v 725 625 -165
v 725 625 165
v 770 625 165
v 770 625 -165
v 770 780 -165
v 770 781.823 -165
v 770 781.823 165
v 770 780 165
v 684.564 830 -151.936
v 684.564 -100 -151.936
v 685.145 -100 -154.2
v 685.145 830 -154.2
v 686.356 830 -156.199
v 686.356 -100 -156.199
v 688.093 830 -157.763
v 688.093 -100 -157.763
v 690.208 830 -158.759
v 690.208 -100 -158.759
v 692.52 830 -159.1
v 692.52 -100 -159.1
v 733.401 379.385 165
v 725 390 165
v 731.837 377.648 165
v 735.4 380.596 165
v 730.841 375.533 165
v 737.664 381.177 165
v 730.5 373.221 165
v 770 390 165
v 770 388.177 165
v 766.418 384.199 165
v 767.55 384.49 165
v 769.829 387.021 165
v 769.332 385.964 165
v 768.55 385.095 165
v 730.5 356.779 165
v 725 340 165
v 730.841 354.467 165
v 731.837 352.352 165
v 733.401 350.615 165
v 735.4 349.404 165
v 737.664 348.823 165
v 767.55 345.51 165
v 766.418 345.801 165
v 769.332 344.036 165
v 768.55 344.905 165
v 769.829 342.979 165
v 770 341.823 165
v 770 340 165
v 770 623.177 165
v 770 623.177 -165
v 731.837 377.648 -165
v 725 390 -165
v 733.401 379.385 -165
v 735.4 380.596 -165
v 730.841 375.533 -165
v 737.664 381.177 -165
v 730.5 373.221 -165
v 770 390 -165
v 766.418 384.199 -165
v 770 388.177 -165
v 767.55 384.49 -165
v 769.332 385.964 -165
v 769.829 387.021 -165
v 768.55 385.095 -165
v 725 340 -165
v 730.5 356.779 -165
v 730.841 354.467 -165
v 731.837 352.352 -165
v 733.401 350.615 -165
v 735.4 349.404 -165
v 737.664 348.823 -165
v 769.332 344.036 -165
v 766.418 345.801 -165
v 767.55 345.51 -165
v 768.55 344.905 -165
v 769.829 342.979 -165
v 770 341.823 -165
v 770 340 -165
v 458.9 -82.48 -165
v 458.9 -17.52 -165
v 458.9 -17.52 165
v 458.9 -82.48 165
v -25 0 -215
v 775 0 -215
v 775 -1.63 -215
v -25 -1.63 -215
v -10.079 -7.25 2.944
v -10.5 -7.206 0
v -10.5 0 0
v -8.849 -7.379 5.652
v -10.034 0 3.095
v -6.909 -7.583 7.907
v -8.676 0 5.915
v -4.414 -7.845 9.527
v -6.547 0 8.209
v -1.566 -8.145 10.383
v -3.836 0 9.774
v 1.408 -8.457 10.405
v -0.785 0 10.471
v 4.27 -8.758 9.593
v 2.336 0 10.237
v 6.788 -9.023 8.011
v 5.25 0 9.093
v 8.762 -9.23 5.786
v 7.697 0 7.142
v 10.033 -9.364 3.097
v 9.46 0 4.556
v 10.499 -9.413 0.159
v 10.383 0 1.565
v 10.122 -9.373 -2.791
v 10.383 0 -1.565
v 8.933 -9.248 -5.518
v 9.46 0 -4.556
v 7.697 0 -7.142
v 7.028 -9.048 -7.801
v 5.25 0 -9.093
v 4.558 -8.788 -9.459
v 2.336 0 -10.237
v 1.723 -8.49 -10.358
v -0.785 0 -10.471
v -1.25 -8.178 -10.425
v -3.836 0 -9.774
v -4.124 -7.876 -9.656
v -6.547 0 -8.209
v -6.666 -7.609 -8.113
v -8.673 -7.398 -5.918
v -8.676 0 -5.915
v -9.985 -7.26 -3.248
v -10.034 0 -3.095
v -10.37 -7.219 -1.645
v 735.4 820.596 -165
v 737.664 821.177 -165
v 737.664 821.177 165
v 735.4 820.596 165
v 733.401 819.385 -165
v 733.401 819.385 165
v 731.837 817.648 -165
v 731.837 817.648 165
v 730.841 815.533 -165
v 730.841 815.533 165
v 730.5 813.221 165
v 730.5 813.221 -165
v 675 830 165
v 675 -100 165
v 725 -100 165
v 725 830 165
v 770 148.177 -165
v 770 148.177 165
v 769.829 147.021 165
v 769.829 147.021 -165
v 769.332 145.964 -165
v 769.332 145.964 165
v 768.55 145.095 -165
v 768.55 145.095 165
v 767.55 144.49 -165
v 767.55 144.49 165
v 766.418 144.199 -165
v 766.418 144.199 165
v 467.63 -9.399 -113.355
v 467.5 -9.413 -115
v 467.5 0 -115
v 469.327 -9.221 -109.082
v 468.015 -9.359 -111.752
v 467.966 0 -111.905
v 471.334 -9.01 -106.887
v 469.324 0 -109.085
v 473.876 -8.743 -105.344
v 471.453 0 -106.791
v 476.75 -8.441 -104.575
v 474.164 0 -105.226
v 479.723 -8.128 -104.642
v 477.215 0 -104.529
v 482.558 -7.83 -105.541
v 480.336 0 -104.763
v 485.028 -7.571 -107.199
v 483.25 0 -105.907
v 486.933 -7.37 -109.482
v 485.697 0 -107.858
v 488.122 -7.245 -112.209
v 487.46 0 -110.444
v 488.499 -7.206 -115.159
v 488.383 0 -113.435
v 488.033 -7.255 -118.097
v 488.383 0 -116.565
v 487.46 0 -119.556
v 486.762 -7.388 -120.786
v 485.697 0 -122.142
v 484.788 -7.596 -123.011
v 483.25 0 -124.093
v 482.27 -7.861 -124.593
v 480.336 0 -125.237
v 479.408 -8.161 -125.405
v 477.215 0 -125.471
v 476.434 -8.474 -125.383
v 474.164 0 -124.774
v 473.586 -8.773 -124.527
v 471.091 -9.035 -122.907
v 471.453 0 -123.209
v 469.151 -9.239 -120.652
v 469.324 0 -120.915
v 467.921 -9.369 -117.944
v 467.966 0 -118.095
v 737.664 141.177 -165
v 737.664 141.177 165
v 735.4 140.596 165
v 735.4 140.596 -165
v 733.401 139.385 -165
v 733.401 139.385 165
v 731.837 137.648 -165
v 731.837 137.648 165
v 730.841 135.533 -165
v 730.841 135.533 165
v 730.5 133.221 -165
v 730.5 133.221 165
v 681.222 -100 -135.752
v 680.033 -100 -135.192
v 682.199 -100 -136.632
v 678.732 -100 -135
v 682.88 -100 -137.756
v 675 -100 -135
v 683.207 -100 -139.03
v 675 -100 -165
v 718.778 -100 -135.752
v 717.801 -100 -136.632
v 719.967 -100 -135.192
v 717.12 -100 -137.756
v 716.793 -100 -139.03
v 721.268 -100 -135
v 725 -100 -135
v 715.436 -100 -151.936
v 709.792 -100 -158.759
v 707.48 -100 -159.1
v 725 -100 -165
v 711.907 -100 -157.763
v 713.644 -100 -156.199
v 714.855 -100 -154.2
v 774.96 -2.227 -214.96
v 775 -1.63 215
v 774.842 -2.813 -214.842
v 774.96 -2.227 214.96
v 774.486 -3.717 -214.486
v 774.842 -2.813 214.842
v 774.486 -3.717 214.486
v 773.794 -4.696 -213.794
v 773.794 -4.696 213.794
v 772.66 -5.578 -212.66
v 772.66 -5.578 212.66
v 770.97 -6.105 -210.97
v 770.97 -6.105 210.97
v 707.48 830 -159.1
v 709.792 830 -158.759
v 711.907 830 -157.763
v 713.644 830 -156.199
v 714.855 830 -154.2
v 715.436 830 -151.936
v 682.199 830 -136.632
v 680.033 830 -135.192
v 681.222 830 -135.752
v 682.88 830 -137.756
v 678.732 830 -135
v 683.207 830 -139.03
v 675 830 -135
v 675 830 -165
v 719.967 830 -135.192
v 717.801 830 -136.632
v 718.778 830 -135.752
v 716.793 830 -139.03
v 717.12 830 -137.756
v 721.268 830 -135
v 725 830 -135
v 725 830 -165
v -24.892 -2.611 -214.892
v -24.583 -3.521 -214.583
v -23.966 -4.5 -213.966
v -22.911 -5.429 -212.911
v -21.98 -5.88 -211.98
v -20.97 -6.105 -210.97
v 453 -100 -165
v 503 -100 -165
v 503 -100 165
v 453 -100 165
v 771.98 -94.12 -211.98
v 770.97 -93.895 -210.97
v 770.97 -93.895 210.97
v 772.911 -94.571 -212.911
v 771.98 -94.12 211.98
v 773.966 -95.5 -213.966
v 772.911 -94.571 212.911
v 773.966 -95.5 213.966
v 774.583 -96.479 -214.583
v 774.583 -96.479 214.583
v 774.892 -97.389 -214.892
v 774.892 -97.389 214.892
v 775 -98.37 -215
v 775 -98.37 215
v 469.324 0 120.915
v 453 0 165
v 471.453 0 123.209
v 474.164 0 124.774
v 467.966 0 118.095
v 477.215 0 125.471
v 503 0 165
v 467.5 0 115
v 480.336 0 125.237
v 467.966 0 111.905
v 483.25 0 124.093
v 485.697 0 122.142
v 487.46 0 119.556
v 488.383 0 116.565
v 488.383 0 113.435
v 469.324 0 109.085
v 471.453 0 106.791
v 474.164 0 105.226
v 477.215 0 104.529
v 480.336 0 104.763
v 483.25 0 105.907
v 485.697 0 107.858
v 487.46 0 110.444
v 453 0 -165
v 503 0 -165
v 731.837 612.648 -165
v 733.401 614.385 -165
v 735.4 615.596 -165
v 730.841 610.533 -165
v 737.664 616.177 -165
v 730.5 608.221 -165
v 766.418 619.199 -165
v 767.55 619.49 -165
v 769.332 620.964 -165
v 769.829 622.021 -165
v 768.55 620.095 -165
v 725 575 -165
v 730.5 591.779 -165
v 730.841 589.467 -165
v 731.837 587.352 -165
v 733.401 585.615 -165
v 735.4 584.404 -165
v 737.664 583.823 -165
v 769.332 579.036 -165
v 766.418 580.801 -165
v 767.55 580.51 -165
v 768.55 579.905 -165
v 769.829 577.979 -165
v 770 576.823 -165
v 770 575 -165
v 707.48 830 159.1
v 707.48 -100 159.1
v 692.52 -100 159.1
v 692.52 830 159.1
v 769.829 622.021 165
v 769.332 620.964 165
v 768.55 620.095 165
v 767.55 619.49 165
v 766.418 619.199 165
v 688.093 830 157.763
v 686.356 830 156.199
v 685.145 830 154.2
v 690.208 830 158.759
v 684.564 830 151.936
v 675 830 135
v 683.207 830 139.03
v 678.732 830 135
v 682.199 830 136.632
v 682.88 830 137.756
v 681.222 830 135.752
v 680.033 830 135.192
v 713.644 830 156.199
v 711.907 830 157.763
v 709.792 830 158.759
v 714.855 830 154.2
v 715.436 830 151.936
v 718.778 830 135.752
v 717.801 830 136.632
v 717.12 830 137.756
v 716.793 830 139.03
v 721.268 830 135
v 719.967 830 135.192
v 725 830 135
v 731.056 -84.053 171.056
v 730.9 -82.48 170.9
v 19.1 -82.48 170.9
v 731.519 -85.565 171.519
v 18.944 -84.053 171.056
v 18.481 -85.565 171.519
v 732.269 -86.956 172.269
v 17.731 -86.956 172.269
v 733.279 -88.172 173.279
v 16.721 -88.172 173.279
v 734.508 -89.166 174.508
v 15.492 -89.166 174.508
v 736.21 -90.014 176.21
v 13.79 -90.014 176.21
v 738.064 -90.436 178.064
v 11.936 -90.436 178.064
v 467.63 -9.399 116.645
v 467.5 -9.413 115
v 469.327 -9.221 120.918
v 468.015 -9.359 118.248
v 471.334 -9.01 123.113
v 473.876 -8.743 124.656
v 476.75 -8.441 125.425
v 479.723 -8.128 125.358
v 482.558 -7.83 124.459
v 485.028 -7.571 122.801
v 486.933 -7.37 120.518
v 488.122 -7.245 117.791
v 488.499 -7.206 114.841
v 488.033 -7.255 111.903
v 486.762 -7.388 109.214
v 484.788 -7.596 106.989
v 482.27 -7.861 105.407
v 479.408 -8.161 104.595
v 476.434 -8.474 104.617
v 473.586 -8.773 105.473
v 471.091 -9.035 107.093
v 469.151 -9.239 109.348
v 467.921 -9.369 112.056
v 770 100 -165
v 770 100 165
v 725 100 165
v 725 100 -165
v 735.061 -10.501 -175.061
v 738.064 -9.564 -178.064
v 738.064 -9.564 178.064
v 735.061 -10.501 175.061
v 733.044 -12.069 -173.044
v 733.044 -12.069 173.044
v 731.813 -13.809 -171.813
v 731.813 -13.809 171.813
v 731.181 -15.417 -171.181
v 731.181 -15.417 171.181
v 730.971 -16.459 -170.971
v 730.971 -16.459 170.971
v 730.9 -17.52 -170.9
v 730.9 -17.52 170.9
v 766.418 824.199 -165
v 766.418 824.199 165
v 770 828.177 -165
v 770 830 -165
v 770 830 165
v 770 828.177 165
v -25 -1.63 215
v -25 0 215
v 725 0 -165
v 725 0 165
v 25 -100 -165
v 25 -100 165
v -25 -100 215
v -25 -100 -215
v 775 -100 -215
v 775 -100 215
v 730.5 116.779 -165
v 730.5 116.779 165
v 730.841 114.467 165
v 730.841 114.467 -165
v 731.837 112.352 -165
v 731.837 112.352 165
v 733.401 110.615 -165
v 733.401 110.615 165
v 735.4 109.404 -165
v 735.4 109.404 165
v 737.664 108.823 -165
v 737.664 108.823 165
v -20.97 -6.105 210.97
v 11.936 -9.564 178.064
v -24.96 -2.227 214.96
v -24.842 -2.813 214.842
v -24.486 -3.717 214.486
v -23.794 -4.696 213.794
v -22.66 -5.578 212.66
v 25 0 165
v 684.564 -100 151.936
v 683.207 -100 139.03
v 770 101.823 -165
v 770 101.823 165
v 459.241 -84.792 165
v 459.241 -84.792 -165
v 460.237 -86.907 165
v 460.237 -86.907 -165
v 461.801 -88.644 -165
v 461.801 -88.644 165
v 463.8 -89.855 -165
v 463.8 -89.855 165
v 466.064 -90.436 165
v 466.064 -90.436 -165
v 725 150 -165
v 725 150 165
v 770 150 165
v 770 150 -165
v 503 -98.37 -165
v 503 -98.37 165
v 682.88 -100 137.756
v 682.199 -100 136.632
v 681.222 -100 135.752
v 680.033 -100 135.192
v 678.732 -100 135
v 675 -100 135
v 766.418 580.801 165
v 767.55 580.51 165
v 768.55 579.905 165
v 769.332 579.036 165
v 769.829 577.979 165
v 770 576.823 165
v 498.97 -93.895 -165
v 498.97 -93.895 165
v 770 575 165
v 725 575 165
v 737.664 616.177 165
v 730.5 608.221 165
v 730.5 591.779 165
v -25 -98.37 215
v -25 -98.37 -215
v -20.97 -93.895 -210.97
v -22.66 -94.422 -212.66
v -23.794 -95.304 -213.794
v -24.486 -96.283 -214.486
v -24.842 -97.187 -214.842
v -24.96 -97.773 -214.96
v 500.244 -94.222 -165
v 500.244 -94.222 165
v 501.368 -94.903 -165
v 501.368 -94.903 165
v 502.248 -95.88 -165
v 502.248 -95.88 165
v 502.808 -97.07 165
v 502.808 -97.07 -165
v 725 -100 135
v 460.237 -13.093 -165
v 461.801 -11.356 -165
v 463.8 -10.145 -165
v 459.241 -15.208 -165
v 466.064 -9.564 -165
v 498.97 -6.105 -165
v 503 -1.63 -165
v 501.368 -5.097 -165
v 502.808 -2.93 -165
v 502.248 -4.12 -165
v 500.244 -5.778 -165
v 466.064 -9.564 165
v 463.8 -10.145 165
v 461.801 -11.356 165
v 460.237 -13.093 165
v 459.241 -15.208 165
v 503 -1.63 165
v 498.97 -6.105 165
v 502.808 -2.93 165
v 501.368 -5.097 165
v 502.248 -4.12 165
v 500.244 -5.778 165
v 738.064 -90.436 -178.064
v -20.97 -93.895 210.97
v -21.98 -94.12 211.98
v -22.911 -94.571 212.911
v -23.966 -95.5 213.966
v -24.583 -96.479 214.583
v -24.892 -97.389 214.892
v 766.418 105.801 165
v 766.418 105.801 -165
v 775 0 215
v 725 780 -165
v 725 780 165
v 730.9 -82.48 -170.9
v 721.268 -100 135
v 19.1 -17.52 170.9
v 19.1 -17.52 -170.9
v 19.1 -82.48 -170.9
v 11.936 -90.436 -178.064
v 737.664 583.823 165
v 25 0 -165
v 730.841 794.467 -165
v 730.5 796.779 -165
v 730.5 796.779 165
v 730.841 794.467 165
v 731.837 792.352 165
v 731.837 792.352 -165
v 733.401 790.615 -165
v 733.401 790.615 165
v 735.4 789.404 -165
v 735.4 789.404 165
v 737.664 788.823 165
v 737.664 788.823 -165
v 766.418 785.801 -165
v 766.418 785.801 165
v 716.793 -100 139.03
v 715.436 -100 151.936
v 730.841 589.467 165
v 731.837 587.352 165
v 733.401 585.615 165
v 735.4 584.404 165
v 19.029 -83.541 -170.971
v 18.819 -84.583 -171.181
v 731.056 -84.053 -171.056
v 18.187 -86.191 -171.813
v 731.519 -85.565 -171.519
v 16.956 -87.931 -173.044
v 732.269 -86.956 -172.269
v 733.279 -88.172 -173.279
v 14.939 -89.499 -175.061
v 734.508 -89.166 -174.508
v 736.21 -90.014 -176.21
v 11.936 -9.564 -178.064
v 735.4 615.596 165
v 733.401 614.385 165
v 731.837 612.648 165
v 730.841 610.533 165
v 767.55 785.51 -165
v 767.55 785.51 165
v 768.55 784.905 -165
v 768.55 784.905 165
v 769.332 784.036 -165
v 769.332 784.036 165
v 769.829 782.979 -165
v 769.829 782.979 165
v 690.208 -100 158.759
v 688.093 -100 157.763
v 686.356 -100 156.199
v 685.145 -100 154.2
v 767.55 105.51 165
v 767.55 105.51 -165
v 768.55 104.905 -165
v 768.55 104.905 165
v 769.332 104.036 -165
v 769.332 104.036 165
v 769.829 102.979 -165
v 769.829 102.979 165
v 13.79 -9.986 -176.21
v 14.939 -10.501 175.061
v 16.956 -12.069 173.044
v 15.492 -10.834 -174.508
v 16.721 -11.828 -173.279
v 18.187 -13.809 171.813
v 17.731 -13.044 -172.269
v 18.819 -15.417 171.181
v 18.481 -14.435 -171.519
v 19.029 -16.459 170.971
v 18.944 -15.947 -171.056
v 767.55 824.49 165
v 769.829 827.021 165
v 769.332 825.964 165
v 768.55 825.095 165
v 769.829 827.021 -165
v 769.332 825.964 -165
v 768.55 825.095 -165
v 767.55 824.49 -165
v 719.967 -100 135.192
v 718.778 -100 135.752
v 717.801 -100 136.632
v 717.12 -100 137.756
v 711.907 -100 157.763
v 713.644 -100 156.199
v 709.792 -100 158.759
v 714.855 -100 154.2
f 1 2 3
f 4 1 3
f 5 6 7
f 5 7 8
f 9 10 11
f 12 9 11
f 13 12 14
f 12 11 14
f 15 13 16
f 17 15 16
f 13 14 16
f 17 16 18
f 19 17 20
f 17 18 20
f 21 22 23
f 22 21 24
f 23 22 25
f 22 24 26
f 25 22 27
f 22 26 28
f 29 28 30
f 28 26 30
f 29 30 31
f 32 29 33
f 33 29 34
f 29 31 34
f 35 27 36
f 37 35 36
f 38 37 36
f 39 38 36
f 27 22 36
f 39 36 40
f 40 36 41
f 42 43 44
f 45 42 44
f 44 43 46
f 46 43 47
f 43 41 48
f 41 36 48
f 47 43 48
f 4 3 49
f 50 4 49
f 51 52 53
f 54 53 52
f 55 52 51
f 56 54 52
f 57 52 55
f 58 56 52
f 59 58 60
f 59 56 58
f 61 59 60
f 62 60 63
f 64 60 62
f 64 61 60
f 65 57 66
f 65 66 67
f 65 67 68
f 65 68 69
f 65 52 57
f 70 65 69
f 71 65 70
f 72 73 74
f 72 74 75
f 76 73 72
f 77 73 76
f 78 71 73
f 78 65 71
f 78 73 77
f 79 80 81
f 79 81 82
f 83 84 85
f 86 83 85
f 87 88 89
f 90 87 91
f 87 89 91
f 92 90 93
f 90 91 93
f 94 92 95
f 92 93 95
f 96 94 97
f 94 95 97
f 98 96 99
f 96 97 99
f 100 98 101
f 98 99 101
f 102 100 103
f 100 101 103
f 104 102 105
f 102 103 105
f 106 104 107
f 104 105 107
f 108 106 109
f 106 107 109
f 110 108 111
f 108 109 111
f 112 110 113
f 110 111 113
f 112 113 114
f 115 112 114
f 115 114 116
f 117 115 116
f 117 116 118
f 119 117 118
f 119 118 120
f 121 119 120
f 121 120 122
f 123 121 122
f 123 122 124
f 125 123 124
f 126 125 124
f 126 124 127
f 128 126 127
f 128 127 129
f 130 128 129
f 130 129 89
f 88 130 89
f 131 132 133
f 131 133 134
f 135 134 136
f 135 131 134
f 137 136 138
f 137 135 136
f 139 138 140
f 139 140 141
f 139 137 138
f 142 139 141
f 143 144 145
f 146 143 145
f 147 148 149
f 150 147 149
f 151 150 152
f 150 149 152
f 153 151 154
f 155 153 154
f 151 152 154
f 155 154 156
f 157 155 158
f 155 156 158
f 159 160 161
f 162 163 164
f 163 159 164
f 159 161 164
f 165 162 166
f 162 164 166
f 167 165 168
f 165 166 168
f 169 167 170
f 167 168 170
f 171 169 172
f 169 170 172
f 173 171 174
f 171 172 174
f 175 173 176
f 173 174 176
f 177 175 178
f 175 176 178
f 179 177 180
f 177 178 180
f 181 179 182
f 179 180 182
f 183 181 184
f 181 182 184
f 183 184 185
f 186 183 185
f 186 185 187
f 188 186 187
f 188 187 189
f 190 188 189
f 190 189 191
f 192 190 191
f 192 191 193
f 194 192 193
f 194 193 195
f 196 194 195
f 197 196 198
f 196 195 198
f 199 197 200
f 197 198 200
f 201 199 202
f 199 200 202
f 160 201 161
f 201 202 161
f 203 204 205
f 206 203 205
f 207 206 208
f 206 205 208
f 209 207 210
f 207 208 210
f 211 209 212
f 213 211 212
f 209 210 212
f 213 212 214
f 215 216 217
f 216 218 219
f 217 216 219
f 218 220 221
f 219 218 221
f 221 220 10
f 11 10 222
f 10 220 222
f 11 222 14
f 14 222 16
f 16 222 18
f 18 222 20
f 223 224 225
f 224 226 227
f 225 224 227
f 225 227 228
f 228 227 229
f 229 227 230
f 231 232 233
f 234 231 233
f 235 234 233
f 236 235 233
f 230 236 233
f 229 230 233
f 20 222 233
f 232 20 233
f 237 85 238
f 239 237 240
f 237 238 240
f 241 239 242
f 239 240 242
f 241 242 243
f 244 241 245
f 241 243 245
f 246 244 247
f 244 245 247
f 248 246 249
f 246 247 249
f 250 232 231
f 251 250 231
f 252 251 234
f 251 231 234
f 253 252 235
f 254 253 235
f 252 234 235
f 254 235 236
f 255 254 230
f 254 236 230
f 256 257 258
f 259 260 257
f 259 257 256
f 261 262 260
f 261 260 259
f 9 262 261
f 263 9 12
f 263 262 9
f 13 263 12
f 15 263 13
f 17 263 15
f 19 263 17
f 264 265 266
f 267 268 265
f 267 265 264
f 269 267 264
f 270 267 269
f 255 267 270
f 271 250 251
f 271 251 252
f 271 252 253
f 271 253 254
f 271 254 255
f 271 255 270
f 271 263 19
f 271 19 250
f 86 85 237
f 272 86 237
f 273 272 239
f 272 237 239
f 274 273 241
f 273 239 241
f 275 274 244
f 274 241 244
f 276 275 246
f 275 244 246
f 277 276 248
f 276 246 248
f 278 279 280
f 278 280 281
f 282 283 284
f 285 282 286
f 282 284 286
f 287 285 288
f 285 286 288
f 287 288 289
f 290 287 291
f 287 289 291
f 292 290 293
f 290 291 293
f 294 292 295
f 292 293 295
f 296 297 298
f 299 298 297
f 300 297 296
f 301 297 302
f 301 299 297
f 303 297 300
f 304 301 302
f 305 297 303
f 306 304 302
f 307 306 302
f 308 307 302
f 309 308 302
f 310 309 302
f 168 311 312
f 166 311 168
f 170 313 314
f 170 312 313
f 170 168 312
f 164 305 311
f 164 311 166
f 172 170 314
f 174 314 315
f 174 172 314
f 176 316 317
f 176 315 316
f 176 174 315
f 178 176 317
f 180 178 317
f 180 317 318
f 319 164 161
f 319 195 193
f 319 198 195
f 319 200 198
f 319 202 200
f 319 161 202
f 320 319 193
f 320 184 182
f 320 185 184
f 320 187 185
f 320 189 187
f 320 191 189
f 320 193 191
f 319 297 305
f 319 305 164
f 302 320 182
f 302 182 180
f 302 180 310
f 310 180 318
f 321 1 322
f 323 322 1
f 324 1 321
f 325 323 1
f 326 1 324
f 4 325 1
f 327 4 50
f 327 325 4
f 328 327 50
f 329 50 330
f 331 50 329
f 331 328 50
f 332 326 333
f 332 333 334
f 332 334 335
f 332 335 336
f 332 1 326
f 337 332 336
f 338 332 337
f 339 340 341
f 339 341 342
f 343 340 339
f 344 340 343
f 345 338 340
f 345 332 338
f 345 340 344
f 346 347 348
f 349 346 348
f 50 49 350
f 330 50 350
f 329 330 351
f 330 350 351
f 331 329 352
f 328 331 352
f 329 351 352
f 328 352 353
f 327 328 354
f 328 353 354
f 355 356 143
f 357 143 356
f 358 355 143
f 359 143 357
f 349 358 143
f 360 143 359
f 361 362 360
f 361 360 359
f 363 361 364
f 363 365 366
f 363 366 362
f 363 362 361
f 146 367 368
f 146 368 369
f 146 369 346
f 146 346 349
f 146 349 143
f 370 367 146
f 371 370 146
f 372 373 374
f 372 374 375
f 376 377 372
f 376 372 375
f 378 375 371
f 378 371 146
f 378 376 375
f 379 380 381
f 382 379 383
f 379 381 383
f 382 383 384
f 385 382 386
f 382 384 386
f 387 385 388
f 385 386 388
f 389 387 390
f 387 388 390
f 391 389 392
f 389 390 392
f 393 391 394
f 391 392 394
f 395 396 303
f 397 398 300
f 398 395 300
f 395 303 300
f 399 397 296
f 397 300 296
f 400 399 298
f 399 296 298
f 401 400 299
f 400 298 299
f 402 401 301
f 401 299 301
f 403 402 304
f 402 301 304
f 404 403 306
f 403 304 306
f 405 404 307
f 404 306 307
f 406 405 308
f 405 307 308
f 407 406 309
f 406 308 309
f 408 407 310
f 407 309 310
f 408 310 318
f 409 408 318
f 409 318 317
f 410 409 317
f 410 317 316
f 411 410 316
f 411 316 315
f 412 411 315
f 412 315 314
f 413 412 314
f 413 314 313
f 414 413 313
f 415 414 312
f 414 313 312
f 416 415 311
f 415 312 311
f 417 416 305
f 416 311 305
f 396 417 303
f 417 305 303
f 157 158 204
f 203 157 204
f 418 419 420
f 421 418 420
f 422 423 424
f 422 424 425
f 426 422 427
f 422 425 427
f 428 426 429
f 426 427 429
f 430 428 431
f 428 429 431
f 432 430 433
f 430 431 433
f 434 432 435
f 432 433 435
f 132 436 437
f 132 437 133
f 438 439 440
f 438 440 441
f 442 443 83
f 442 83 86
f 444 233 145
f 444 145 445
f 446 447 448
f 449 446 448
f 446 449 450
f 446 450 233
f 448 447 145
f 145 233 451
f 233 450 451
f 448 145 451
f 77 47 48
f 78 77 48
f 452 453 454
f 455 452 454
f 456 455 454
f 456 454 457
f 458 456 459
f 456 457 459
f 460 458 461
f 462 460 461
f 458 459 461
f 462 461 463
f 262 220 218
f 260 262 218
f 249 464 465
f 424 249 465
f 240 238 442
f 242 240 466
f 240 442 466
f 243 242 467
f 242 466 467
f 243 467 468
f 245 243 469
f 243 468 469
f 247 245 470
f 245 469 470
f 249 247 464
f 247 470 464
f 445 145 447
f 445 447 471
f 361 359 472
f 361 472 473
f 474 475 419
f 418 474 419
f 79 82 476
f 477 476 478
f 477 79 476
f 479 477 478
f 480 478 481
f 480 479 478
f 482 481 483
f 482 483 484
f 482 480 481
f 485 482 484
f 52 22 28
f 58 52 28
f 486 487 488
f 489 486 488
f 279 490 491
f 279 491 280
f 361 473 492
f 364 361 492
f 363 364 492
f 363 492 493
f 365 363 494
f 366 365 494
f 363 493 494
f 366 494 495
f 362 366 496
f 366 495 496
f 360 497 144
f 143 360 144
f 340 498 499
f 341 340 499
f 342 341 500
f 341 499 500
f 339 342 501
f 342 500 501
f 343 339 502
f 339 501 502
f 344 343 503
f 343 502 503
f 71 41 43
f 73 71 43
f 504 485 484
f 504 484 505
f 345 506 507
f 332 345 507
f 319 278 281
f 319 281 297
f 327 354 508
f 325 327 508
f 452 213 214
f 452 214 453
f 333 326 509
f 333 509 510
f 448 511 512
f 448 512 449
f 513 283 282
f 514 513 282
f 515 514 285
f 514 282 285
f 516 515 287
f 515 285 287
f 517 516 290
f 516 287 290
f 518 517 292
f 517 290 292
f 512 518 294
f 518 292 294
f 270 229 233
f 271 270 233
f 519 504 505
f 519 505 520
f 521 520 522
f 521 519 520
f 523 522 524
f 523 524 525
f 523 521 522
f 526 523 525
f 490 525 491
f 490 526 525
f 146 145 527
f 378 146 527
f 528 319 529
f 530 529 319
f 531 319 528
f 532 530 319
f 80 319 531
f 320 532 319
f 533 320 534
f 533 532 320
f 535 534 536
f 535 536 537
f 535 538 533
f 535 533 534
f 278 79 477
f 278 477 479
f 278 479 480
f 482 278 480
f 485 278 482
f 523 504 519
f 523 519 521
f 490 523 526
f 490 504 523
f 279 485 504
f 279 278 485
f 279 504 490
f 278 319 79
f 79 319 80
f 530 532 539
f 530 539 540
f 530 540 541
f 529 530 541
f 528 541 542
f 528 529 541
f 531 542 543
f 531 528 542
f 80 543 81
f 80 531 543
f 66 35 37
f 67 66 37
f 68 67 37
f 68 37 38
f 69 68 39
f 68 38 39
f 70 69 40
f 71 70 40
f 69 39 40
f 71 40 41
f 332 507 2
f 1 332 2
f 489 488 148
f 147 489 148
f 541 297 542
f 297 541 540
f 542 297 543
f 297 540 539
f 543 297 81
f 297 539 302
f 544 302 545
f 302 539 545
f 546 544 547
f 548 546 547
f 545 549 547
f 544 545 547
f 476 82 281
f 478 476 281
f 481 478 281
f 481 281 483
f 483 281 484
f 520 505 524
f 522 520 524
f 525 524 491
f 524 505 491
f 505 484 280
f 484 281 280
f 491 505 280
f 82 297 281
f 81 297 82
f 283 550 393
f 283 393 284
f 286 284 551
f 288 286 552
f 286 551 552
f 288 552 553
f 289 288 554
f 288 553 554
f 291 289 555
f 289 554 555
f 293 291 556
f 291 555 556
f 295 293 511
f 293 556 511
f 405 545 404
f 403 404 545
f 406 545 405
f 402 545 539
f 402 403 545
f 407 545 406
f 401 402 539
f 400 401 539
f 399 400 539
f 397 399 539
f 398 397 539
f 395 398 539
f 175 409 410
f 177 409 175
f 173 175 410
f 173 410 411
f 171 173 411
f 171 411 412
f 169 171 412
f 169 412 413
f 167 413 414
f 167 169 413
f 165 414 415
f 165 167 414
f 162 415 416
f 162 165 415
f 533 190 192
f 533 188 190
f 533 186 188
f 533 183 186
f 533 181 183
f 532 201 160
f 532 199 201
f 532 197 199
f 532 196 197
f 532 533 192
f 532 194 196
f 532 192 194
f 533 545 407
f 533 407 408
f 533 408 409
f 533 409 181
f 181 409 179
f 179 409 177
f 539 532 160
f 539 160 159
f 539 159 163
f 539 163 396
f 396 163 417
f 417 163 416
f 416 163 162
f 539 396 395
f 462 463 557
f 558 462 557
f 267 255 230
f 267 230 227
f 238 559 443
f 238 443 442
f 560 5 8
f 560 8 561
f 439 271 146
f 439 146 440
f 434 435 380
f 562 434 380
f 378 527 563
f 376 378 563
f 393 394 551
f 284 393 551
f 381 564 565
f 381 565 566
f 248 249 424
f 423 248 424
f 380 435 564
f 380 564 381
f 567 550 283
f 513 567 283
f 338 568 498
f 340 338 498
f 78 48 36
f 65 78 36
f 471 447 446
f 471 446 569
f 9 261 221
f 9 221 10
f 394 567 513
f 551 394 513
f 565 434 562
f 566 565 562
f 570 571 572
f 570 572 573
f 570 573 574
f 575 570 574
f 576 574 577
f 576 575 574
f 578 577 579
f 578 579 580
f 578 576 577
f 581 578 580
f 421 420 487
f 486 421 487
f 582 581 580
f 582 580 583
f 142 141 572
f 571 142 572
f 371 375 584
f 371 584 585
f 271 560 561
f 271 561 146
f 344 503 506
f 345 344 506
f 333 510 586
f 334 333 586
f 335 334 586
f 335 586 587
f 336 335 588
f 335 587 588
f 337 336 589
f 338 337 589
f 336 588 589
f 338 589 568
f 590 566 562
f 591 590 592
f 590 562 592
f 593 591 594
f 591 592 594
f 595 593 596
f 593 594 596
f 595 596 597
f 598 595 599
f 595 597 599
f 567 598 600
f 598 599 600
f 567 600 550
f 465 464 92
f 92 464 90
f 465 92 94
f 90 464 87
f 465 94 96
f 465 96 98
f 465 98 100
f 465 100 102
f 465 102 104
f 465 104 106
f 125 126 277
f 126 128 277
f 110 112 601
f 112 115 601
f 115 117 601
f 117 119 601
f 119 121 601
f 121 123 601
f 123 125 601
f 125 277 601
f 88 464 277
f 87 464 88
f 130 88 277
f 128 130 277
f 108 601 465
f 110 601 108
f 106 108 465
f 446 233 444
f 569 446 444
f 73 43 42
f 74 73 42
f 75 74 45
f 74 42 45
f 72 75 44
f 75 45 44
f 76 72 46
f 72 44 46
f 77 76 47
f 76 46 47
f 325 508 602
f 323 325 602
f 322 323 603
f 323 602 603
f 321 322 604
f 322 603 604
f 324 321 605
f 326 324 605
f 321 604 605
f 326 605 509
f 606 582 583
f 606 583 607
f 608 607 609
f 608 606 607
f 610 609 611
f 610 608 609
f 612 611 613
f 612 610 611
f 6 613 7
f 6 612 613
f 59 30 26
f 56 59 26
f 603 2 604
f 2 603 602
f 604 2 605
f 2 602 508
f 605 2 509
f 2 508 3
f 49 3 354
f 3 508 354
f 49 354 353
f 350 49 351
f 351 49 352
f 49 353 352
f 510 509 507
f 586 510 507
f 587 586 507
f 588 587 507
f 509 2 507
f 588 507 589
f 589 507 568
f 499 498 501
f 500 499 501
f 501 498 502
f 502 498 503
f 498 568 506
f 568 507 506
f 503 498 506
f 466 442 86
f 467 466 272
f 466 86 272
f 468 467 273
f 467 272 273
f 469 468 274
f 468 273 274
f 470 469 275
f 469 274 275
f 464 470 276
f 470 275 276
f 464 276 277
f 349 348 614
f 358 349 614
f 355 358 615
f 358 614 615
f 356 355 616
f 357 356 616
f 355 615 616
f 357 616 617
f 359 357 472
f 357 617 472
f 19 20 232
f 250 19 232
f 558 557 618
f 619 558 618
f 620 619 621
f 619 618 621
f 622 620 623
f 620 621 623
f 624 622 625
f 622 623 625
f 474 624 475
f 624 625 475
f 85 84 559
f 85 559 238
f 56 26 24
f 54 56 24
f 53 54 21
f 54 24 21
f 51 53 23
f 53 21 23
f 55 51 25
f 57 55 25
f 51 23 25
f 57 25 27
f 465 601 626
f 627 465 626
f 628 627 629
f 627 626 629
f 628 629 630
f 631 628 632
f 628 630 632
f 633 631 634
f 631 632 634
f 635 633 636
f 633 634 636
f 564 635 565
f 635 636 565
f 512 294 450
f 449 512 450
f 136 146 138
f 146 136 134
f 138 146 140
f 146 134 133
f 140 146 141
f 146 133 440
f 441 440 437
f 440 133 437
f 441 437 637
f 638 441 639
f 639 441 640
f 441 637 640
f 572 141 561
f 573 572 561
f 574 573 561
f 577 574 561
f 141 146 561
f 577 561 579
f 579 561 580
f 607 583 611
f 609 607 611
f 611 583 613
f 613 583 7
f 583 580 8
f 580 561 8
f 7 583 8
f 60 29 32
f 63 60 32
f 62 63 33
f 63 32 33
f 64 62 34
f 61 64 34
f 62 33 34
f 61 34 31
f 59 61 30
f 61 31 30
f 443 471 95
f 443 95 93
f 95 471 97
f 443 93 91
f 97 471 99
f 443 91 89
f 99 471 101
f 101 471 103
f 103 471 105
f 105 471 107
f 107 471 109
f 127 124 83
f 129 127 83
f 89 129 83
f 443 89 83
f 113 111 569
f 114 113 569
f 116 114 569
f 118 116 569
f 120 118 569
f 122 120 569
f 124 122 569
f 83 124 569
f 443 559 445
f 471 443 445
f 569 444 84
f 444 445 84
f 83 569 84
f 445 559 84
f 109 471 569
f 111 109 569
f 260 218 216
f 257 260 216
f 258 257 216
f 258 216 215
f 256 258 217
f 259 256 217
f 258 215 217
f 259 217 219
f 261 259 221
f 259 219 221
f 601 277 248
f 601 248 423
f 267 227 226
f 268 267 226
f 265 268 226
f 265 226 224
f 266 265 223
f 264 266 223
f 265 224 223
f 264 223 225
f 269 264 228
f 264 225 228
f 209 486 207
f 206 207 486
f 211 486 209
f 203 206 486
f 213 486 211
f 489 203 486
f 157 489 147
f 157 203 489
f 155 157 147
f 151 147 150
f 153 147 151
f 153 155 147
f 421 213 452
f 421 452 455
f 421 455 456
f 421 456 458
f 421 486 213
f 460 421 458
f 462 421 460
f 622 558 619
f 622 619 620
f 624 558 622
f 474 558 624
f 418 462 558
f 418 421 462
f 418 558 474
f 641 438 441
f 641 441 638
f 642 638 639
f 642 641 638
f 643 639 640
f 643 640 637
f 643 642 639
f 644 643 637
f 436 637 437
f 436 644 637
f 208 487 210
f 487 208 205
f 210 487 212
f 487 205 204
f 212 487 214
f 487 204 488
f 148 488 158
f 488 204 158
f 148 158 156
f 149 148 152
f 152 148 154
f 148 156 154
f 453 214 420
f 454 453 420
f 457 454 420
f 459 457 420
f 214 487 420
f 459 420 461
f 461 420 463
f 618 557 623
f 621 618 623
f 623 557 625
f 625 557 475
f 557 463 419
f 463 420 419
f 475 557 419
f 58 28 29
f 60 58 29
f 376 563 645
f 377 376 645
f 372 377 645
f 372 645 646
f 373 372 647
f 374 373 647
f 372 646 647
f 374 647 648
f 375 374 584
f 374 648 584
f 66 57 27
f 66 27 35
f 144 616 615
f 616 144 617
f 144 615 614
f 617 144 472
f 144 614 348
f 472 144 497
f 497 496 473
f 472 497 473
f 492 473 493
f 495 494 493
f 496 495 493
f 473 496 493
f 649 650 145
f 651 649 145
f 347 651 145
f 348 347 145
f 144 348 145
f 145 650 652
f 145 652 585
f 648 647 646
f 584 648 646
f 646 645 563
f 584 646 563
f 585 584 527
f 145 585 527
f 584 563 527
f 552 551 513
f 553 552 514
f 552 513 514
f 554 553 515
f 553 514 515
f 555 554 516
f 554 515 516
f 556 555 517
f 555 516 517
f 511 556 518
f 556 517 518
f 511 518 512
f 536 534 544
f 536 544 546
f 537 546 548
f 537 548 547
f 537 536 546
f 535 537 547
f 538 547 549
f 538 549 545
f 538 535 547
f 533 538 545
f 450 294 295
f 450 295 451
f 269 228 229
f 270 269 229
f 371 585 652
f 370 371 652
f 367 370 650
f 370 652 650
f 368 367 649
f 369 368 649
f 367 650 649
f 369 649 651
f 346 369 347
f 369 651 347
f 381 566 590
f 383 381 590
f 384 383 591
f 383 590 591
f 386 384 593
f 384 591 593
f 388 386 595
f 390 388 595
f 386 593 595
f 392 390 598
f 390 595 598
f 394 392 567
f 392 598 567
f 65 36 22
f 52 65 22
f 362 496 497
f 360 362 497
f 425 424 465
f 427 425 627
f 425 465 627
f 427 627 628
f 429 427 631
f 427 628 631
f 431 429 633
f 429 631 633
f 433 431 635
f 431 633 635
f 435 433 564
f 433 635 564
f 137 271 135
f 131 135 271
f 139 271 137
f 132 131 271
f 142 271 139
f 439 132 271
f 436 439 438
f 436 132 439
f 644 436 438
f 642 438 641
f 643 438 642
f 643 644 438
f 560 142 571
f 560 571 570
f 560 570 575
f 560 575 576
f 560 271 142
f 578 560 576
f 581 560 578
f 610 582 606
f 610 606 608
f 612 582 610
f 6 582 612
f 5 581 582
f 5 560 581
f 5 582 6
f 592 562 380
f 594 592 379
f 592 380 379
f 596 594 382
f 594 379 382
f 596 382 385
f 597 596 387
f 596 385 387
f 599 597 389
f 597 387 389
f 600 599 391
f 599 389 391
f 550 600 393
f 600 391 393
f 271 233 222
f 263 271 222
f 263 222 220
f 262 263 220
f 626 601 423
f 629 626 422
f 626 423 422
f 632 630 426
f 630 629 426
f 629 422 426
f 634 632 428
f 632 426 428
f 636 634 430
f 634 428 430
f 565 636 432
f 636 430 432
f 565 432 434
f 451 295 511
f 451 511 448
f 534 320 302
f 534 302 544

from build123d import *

# Parameters (mm, degrees)
MEMBER_1_DEPTH      = 442.803398875
MEMBER_1_DEPTH_BACK = 112.803398875
MEMBER_1_2_DEPTH    = 925.60679775
MEMBER_1_3_DEPTH    = 555.60679775
MEMBER_1_4_DEPTH    = 925.60679775
MEMBER_2_DEPTH      = 330
SKETCH_4_R          = 10.5
CUT_EXTRUDE_1_DEPTH = 10
MEMBER_START        = -100
MEMBER_3_DEPTH      = 930
MEMBER_5_DEPTH      = 330
MEMBER_5_2_DEPTH    = 330
MEMBER_5_3_DEPTH    = 330
MEMBER_5_4_DEPTH    = 330


# Read off the part's stored shape, not the designer's step: Конструкция3
with BuildPart() as part:
    # Sketch1 → Member 1 (new, two sides: drawn at the far end of the back side and taken through both)
    with BuildSketch(Plane(origin=(25, 0, -165), x_dir=(-1, 0, 0), z_dir=(0, 0, 1)).offset(-MEMBER_1_DEPTH_BACK)):
        with BuildLine():
            Line((50, 100), (0, 100))
            Line((0, 100), (0, 0))
            Line((0, 0), (50, 0))
            Line((50, 0), (50, 1.629852671))
            ThreePointArc((50, 1.629852671), (48.844151715, 4.6409404), (45.970378085, 6.1052012))
            Line((45.970378085, 6.1052012), (13.063772294, 9.563824837))
            ThreePointArc((13.063772294, 9.563824837), (7.954841396, 12.166955149), (5.9, 17.52))
            Line((5.9, 17.52), (5.9, 82.48))
            ThreePointArc((5.9, 82.48), (7.954841396, 87.833044851), (13.063772294, 90.436175163))
            Line((13.063772294, 90.436175163), (45.970378085, 93.8947988))
            ThreePointArc((45.970378085, 93.8947988), (48.844151715, 95.3590596), (50, 98.370147329))
            Line((50, 98.370147329), (50, 100))
        make_face()
    extrude(amount=MEMBER_1_DEPTH + MEMBER_1_DEPTH_BACK)

    # Member 1 mitre 1
    split(bisect_by=Plane(origin=(25, 0, -165), x_dir=(0, -1, 0), z_dir=(-0.707106781, 0, 0.707106781)), keep=Keep.TOP)

    # Member 1 mitre 2
    split(bisect_by=Plane(origin=(25, 0, 165), x_dir=(0, -1, 0), z_dir=(-0.707106781, 0, -0.707106781)), keep=Keep.TOP)


with BuildPart() as body_2:
    # Sketch1 on segment 2 (carried to segment 2) → Member 1 2 (new body)
    with BuildSketch(Plane(origin=(-87.803398875, 0, 165), x_dir=(0, 0, 1), z_dir=(1, 0, 0))):
        with BuildLine():
            Line((50, 100), (0, 100))
            Line((0, 100), (0, 0))
            Line((0, 0), (50, 0))
            Line((50, 0), (50, 1.629852671))
            ThreePointArc((50, 1.629852671), (48.844151715, 4.6409404), (45.970378085, 6.1052012))
            Line((45.970378085, 6.1052012), (13.063772294, 9.563824837))
            ThreePointArc((13.063772294, 9.563824837), (7.954841396, 12.166955149), (5.9, 17.52))
            Line((5.9, 17.52), (5.9, 82.48))
            ThreePointArc((5.9, 82.48), (7.954841396, 87.833044851), (13.063772294, 90.436175163))
            Line((13.063772294, 90.436175163), (45.970378085, 93.8947988))
            ThreePointArc((45.970378085, 93.8947988), (48.844151715, 95.3590596), (50, 98.370147329))
            Line((50, 98.370147329), (50, 100))
        make_face()
    extrude(amount=MEMBER_1_2_DEPTH)

    # Member 1 2 mitre 1
    split(bisect_by=Plane(origin=(25, 0, 165), x_dir=(0, 1, 0), z_dir=(0.707106781, 0, 0.707106781)), keep=Keep.TOP)

    # Member 1 2 mitre 2
    split(bisect_by=Plane(origin=(725, 0, 165), x_dir=(0, -1, 0), z_dir=(-0.707106781, 0, 0.707106781)), keep=Keep.TOP)


with BuildPart() as body_3:
    # Sketch1 on segment 3 (carried to segment 3) → Member 1 3 (new body)
    with BuildSketch(Plane(origin=(725, 0, 277.803398875), x_dir=(1, 0, 0), z_dir=(0, 0, -1))):
        with BuildLine():
            Line((50, 100), (0, 100))
            Line((0, 100), (0, 0))
            Line((0, 0), (50, 0))
            Line((50, 0), (50, 1.629852671))
            ThreePointArc((50, 1.629852671), (48.844151715, 4.6409404), (45.970378085, 6.1052012))
            Line((45.970378085, 6.1052012), (13.063772294, 9.563824837))
            ThreePointArc((13.063772294, 9.563824837), (7.954841396, 12.166955149), (5.9, 17.52))
            Line((5.9, 17.52), (5.9, 82.48))
            ThreePointArc((5.9, 82.48), (7.954841396, 87.833044851), (13.063772294, 90.436175163))
            Line((13.063772294, 90.436175163), (45.970378085, 93.8947988))
            ThreePointArc((45.970378085, 93.8947988), (48.844151715, 95.3590596), (50, 98.370147329))
            Line((50, 98.370147329), (50, 100))
        make_face()
    extrude(amount=MEMBER_1_3_DEPTH)

    # Member 1 3 mitre 1
    split(bisect_by=Plane(origin=(725, 0, 165), x_dir=(0, 1, 0), z_dir=(0.707106781, 0, -0.707106781)), keep=Keep.TOP)

    # Member 1 3 mitre 2
    split(bisect_by=Plane(origin=(725, 0, -165), x_dir=(0, 1, 0), z_dir=(0.707106781, 0, 0.707106781)), keep=Keep.TOP)


with BuildPart() as body_4:
    # Sketch1 on segment 4 (carried to segment 4) → Member 1 4 (new body)
    with BuildSketch(Plane(origin=(837.803398875, 0, -165), x_dir=(0, 0, -1), z_dir=(-1, 0, 0))):
        with BuildLine():
            Line((50, 100), (0, 100))
            Line((0, 100), (0, 0))
            Line((0, 0), (50, 0))
            Line((50, 0), (50, 1.629852671))
            ThreePointArc((50, 1.629852671), (48.844151715, 4.6409404), (45.970378085, 6.1052012))
            Line((45.970378085, 6.1052012), (13.063772294, 9.563824837))
            ThreePointArc((13.063772294, 9.563824837), (7.954841396, 12.166955149), (5.9, 17.52))
            Line((5.9, 17.52), (5.9, 82.48))
            ThreePointArc((5.9, 82.48), (7.954841396, 87.833044851), (13.063772294, 90.436175163))
            Line((13.063772294, 90.436175163), (45.970378085, 93.8947988))
            ThreePointArc((45.970378085, 93.8947988), (48.844151715, 95.3590596), (50, 98.370147329))
            Line((50, 98.370147329), (50, 100))
        make_face()
    extrude(amount=MEMBER_1_4_DEPTH)

    # Member 1 4 mitre 1
    split(bisect_by=Plane(origin=(25, 0, -165), x_dir=(0, 1, 0), z_dir=(0.707106781, 0, -0.707106781)), keep=Keep.TOP)

    # Member 1 4 mitre 2
    split(bisect_by=Plane(origin=(725, 0, -165), x_dir=(0, -1, 0), z_dir=(-0.707106781, 0, -0.707106781)), keep=Keep.TOP)


with BuildPart() as part_1:
    add(part.part)

    # Member 1 as one body: union body 2, body 3, body 4
    add(body_2.part)
    add(body_3.part)
    add(body_4.part)


with BuildPart() as body_2_2:
    # Sketch11 → Member 2 (new body)
    with BuildSketch(Plane(origin=(453, 0, -165), x_dir=(1, 0, 0), z_dir=(0, 0, -1))):
        with BuildLine():
            Line((50, 100), (0, 100))
            Line((0, 100), (0, 0))
            Line((0, 0), (50, 0))
            Line((50, 0), (50, 1.629852671))
            ThreePointArc((50, 1.629852671), (48.844151715, 4.6409404), (45.970378085, 6.1052012))
            Line((45.970378085, 6.1052012), (13.063772294, 9.563824837))
            ThreePointArc((13.063772294, 9.563824837), (7.954841396, 12.166955149), (5.9, 17.52))
            Line((5.9, 17.52), (5.9, 82.48))
            ThreePointArc((5.9, 82.48), (7.954841396, 87.833044851), (13.063772294, 90.436175163))
            Line((13.063772294, 90.436175163), (45.970378085, 93.8947988))
            ThreePointArc((45.970378085, 93.8947988), (48.844151715, 95.3590596), (50, 98.370147329))
            Line((50, 98.370147329), (50, 100))
        make_face()
    extrude(amount=-MEMBER_2_DEPTH)


with BuildPart() as cut_extrude_1_tool:
    # Эскиз4 → Вырез-Вытянуть1 (new body)
    with BuildSketch(Plane(origin=(0, 0, 0), x_dir=(1, 0, 0), z_dir=(0, 1, 0))):
        with Locations(Location((0, 0, 0), (0, 0, 180))):
            Circle(SKETCH_4_R)
        with Locations(Location((478, -115, 0), (0, 0, 180))):
            Circle(SKETCH_4_R)
        with Locations(Location((478, 115, 0), (0, 0, 180))):
            Circle(SKETCH_4_R)
    extrude(amount=-CUT_EXTRUDE_1_DEPTH)


with BuildPart() as part_2:
    add(part_1.part)

    # Вырез-Вытянуть1: cut by cut_extrude_1_tool
    add(cut_extrude_1_tool.part, mode=Mode.SUBTRACT)


with BuildPart() as body_2_2_1:
    add(body_2_2.part)

    # Вырез-Вытянуть1: cut by cut_extrude_1_tool
    add(cut_extrude_1_tool.part, mode=Mode.SUBTRACT)


with BuildPart() as body_3_2:
    # Member 3 outline → Member 3 (new body)
    with BuildSketch(Plane(origin=(0, 0, 0), x_dir=(1, 0, 0), z_dir=(0, 1, 0)).offset(MEMBER_START)):
        with BuildLine():
            Line((684.563824837, -151.936227706), (683.207285906, -139.029621915))
            ThreePointArc((683.207285906, -139.029621915), (681.743025105, -136.155848285), (678.731937376, -135))
            Line((678.731937376, -135), (675, -135))
            Line((675, -135), (675, -165))
            Line((675, -165), (725, -165))
            Line((725, -165), (725, -135))
            Line((725, -135), (721.268062624, -135))
            ThreePointArc((721.268062624, -135), (718.256974895, -136.155848285), (716.792714094, -139.029621915))
            Line((716.792714094, -139.029621915), (715.436175163, -151.936227706))
            ThreePointArc((715.436175163, -151.936227706), (712.833044851, -157.045158604), (707.48, -159.1))
            Line((707.48, -159.1), (692.52, -159.1))
            ThreePointArc((692.52, -159.1), (687.166955149, -157.045158604), (684.563824837, -151.936227706))
        make_face()
        with BuildLine():
            Line((721.268062624, 135), (725, 135))
            Line((725, 135), (725, 165))
            Line((725, 165), (675, 165))
            Line((675, 165), (675, 135))
            Line((675, 135), (678.731937376, 135))
            ThreePointArc((678.731937376, 135), (681.743025105, 136.155848285), (683.207285906, 139.029621915))
            Line((683.207285906, 139.029621915), (684.563824837, 151.936227706))
            ThreePointArc((684.563824837, 151.936227706), (687.166955149, 157.045158604), (692.52, 159.1))
            Line((692.52, 159.1), (707.48, 159.1))
            ThreePointArc((707.48, 159.1), (712.833044851, 157.045158604), (715.436175163, 151.936227706))
            Line((715.436175163, 151.936227706), (716.792714094, 139.029621915))
            ThreePointArc((716.792714094, 139.029621915), (718.256974895, 136.155848285), (721.268062624, 135))
        make_face()
    extrude(amount=MEMBER_3_DEPTH)


with BuildPart() as body_4_2:
    # Sketch16 → Member 5 (new body)
    with BuildSketch(Plane(origin=(725, 830, -165), x_dir=(1, 0, 0), z_dir=(0, 0, -1))):
        with BuildLine():
            Line((45, 50), (0, 50))
            Line((0, 50), (0, 0))
            Line((0, 0), (45, 0))
            Line((45, 0), (45, 1.822575176))
            ThreePointArc((45, 1.822575176), (43.972579302, 4.499097602), (41.418113853, 5.800662758))
            Line((41.418113853, 5.800662758), (12.663772294, 8.822865838))
            ThreePointArc((12.663772294, 8.822865838), (7.554841396, 11.42599615), (5.5, 16.779041001))
            Line((5.5, 16.779041001), (5.5, 33.220958999))
            ThreePointArc((5.5, 33.220958999), (7.554841396, 38.57400385), (12.663772294, 41.177134162))
            Line((12.663772294, 41.177134162), (41.418113853, 44.199337242))
            ThreePointArc((41.418113853, 44.199337242), (43.972579302, 45.500902398), (45, 48.177424824))
            Line((45, 48.177424824), (45, 50))
        make_face()
    extrude(amount=-MEMBER_5_DEPTH)


with BuildPart() as body_5:
    # Sketch16 on segment 2 (carried to segment 2) → Member 5 2 (new body)
    with BuildSketch(Plane(origin=(725, 150, 165), x_dir=(1, 0, 0), z_dir=(0, 0, -1))):
        with BuildLine():
            Line((45, 50), (0, 50))
            Line((0, 50), (0, 0))
            Line((0, 0), (45, 0))
            Line((45, 0), (45, 1.822575176))
            ThreePointArc((45, 1.822575176), (43.972579302, 4.499097602), (41.418113853, 5.800662758))
            Line((41.418113853, 5.800662758), (12.663772294, 8.822865838))
            ThreePointArc((12.663772294, 8.822865838), (7.554841396, 11.42599615), (5.5, 16.779041001))
            Line((5.5, 16.779041001), (5.5, 33.220958999))
            ThreePointArc((5.5, 33.220958999), (7.554841396, 38.57400385), (12.663772294, 41.177134162))
            Line((12.663772294, 41.177134162), (41.418113853, 44.199337242))
            ThreePointArc((41.418113853, 44.199337242), (43.972579302, 45.500902398), (45, 48.177424824))
            Line((45, 48.177424824), (45, 50))
        make_face()
    extrude(amount=MEMBER_5_2_DEPTH)


with BuildPart() as body_6:
    # Sketch16 on segment 3 (carried to segment 3) → Member 5 3 (new body)
    with BuildSketch(Plane(origin=(725, 625, 165), x_dir=(1, 0, 0), z_dir=(0, 0, -1))):
        with BuildLine():
            Line((45, 50), (0, 50))
            Line((0, 50), (0, 0))
            Line((0, 0), (45, 0))
            Line((45, 0), (45, 1.822575176))
            ThreePointArc((45, 1.822575176), (43.972579302, 4.499097602), (41.418113853, 5.800662758))
            Line((41.418113853, 5.800662758), (12.663772294, 8.822865838))
            ThreePointArc((12.663772294, 8.822865838), (7.554841396, 11.42599615), (5.5, 16.779041001))
            Line((5.5, 16.779041001), (5.5, 33.220958999))
            ThreePointArc((5.5, 33.220958999), (7.554841396, 38.57400385), (12.663772294, 41.177134162))
            Line((12.663772294, 41.177134162), (41.418113853, 44.199337242))
            ThreePointArc((41.418113853, 44.199337242), (43.972579302, 45.500902398), (45, 48.177424824))
            Line((45, 48.177424824), (45, 50))
        make_face()
    extrude(amount=MEMBER_5_3_DEPTH)


with BuildPart() as body_7:
    # Sketch16 on segment 4 (carried to segment 4) → Member 5 4 (new body)
    with BuildSketch(Plane(origin=(725, 390, 165), x_dir=(1, 0, 0), z_dir=(0, 0, -1))):
        with BuildLine():
            Line((45, 50), (0, 50))
            Line((0, 50), (0, 0))
            Line((0, 0), (45, 0))
            Line((45, 0), (45, 1.822575176))
            ThreePointArc((45, 1.822575176), (43.972579302, 4.499097602), (41.418113853, 5.800662758))
            Line((41.418113853, 5.800662758), (12.663772294, 8.822865838))
            ThreePointArc((12.663772294, 8.822865838), (7.554841396, 11.42599615), (5.5, 16.779041001))
            Line((5.5, 16.779041001), (5.5, 33.220958999))
            ThreePointArc((5.5, 33.220958999), (7.554841396, 38.57400385), (12.663772294, 41.177134162))
            Line((12.663772294, 41.177134162), (41.418113853, 44.199337242))
            ThreePointArc((41.418113853, 44.199337242), (43.972579302, 45.500902398), (45, 48.177424824))
            Line((45, 48.177424824), (45, 50))
        make_face()
    extrude(amount=MEMBER_5_4_DEPTH)


solid = Compound([part_2.part, body_2_2_1.part, body_3_2.part, body_4_2.part, body_5.part, body_6.part, body_7.part])
